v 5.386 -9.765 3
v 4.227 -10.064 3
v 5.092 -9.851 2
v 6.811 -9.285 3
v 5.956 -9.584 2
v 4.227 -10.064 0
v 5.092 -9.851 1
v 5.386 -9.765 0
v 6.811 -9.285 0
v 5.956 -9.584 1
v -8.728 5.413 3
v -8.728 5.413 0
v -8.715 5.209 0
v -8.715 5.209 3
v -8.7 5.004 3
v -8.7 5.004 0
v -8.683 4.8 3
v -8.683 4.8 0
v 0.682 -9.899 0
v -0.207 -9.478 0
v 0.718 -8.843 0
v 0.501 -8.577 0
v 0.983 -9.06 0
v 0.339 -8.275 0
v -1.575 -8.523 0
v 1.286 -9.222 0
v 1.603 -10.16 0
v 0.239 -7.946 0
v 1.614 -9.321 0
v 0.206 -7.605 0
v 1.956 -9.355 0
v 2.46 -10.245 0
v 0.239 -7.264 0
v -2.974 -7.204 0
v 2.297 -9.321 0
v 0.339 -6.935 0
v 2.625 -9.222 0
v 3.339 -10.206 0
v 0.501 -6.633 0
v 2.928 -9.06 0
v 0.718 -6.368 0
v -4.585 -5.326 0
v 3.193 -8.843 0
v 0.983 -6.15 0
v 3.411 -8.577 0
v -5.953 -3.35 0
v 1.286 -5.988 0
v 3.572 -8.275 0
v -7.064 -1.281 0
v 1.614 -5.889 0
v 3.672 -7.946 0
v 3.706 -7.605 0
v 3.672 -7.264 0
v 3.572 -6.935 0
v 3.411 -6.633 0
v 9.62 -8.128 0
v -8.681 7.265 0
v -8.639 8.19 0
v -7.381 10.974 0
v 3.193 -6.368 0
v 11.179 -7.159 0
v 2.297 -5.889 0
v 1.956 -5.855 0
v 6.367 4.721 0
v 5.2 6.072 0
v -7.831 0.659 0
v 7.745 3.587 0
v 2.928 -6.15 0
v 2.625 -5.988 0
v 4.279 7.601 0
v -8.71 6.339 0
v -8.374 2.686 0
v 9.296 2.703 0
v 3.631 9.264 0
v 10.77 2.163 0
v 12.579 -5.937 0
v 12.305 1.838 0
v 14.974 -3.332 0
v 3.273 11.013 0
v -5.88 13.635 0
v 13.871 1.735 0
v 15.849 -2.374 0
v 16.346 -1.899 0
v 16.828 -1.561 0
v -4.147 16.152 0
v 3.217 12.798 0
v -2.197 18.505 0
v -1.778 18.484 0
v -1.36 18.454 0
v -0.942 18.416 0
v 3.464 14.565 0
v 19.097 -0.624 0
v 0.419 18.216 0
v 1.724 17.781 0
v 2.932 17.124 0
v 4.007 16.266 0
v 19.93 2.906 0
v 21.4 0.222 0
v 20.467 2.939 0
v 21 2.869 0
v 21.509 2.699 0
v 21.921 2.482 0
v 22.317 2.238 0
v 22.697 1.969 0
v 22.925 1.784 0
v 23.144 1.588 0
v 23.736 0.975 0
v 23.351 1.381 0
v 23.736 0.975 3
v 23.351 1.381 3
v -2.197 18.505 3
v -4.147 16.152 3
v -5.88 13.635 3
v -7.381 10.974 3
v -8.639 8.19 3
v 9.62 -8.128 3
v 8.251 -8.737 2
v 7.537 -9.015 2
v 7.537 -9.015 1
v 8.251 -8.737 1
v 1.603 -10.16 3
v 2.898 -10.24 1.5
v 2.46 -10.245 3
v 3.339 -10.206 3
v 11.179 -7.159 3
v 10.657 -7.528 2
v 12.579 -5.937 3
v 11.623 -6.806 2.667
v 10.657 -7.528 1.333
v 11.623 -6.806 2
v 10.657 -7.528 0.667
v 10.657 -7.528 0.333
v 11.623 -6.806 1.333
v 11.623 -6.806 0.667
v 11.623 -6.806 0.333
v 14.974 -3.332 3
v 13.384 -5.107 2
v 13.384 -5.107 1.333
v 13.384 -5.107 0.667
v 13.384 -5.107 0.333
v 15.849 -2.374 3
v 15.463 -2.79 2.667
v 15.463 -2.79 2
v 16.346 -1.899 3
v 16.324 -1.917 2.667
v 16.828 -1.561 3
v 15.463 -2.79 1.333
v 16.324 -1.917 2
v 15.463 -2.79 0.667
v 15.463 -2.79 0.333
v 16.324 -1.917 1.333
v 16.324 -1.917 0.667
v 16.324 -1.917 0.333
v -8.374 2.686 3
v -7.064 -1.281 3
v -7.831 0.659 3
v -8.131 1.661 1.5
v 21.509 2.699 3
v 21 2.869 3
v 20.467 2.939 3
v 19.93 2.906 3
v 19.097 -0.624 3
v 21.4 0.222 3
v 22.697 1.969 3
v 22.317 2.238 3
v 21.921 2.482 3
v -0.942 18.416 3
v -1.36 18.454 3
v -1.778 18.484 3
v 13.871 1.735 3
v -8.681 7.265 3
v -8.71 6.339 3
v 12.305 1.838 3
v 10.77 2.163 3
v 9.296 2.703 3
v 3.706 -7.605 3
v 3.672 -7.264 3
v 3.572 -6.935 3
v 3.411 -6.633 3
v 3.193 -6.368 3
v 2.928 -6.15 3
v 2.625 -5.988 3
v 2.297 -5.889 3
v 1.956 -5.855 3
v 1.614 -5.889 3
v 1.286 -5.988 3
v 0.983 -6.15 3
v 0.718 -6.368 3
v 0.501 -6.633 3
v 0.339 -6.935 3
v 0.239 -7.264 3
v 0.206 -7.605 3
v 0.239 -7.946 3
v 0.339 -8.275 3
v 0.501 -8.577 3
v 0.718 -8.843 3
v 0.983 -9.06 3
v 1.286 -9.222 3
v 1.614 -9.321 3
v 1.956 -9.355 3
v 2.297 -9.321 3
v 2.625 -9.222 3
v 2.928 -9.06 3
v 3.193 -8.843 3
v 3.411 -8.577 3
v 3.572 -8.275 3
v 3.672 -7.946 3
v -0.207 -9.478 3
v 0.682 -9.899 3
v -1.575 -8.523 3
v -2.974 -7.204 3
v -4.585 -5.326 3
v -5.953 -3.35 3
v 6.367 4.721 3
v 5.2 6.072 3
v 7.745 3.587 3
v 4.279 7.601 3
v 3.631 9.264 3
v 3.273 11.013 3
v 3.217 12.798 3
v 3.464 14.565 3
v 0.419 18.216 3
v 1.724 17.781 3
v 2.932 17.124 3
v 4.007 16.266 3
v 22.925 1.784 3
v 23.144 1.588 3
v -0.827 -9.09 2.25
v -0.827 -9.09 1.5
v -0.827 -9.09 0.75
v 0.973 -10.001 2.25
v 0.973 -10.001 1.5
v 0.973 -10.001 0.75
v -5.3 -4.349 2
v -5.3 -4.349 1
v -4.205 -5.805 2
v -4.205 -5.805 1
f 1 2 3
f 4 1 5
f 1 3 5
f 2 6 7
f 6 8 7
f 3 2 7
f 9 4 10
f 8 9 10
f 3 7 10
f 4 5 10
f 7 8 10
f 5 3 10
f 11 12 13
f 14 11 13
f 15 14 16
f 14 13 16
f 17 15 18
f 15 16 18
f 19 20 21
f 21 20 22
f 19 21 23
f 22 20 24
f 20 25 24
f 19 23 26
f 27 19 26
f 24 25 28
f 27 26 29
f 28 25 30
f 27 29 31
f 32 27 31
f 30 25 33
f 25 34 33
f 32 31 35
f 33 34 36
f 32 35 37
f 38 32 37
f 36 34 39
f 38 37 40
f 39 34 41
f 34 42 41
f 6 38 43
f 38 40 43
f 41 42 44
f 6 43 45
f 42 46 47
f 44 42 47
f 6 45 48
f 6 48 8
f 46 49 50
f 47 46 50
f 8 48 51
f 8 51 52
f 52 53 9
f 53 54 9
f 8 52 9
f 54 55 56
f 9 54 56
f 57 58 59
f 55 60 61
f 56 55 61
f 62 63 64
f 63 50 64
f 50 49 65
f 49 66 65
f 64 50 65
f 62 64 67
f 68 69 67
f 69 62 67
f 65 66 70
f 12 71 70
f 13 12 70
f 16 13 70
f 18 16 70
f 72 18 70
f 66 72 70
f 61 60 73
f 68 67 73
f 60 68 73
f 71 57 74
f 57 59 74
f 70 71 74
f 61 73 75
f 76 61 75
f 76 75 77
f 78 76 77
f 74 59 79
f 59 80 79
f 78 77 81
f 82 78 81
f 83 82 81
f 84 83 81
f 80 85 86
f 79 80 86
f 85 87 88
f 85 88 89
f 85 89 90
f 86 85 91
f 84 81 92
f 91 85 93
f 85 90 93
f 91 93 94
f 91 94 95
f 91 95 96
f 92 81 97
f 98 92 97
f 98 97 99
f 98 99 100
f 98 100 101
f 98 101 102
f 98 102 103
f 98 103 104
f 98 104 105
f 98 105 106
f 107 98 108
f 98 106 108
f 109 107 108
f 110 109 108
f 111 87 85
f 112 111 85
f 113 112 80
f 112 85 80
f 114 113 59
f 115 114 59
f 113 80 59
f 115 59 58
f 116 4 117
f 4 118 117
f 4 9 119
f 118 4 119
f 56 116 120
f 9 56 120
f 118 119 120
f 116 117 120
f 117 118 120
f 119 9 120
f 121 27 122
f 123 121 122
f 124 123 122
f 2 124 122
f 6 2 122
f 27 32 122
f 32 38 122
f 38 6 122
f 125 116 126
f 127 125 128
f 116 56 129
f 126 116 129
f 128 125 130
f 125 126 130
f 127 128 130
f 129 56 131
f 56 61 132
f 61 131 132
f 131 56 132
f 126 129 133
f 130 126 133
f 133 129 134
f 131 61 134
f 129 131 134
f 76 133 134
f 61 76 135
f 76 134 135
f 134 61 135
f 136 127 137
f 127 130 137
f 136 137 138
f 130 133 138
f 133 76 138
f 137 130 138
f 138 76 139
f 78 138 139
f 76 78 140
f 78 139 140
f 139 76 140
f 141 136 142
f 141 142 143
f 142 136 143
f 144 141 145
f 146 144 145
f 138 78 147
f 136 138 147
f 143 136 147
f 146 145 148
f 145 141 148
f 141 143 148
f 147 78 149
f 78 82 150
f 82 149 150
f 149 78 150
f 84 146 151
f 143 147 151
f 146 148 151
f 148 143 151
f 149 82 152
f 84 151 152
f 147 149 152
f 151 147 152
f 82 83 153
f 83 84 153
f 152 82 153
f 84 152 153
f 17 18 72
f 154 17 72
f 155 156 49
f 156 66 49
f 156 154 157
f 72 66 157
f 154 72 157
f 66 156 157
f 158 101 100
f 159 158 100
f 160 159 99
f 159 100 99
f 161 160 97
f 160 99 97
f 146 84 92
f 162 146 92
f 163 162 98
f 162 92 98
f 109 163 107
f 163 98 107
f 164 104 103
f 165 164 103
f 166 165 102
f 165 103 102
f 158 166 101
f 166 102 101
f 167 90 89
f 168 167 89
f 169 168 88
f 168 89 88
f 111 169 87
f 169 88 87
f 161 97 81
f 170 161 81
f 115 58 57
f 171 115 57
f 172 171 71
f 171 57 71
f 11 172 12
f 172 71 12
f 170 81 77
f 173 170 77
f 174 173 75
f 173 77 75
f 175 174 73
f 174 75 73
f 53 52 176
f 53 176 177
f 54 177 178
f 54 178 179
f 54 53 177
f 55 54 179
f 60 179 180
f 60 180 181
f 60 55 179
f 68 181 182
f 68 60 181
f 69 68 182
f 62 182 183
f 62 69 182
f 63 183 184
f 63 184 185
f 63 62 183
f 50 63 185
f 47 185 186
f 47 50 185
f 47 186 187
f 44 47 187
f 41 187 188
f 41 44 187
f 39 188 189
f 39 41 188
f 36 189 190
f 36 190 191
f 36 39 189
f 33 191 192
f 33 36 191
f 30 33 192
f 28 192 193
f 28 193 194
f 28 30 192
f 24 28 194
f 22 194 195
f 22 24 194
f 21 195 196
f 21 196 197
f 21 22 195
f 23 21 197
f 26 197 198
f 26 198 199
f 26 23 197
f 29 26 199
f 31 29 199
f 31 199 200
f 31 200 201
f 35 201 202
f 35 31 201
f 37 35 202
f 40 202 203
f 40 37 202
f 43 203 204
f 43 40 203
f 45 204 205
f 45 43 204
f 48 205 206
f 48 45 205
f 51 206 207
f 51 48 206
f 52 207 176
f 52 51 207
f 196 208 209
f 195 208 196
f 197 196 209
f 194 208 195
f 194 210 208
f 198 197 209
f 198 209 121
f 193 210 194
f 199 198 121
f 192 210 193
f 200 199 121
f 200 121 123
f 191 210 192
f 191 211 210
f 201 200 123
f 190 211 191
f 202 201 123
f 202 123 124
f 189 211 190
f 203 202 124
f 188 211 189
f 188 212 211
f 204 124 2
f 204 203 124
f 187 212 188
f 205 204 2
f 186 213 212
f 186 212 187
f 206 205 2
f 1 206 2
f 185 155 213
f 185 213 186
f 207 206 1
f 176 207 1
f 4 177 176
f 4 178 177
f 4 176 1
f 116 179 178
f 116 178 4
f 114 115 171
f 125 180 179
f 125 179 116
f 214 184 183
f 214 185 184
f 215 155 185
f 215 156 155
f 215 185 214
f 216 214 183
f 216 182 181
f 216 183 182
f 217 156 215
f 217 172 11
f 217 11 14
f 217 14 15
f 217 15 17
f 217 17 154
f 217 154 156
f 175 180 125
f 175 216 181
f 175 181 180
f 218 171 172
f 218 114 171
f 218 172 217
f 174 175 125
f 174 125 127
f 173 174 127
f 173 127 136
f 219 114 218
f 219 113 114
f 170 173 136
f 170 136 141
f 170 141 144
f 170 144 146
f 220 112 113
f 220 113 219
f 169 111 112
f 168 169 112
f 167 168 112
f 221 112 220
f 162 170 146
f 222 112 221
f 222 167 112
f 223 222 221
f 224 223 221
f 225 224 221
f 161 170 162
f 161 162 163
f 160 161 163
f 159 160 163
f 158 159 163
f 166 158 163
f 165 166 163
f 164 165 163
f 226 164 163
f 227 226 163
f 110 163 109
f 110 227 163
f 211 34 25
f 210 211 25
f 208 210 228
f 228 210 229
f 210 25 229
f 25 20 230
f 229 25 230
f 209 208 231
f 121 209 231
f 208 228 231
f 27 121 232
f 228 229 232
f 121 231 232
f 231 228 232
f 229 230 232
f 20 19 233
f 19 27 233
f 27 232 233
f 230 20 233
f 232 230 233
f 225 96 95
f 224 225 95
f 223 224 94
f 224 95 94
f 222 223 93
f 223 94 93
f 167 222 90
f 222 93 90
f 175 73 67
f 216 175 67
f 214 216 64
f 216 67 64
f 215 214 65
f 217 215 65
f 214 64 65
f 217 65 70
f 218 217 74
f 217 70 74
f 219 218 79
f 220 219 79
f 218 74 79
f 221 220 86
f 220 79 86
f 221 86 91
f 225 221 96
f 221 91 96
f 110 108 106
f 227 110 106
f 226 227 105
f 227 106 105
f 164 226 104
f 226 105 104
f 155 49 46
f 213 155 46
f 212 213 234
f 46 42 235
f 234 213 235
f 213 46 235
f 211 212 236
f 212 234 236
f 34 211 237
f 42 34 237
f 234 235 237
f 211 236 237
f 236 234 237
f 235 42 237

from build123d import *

# Parameters (mm, degrees)
SKETCH1_R           = 1.75
BOSS_EXTRUDE1_DEPTH = 3


with BuildPart() as part:
    # Sketch1 → Boss-Extrude1 (new body)
    with BuildSketch(Plane.XY):
        with BuildLine():
            Line((19.930411003, 2.905988798), (13.87145238, 1.735459786))
            ThreePointArc((13.87145238, 1.735459786), (11.531557717, 1.972597442), (9.296030987, 2.703187301))
            ThreePointArc((9.296030987, 2.703187301), (3.919484189, 8.419131518), (4.006841218, 16.265891519))
            ThreePointArc((4.006841218, 16.265891519), (1.723665713, 17.781070836), (-0.941946899, 18.416026075))
            ThreePointArc((-0.941946899, 18.416026075), (-1.568863415, 18.470126635), (-2.197160171, 18.50468636))
            ThreePointArc((-2.197160171, 18.50468636), (-5.87970066, 13.635417111), (-8.639038917, 8.189598545))
            ThreePointArc((-8.639038917, 8.189598545), (-8.697179287, 6.801867653), (-8.727525387, 5.413250916))
            ThreePointArc((-8.727525387, 5.413250916), (-8.707936379, 5.106364202), (-8.683372389, 4.799835582))
            add(Edge.make_bspline(
                [(-8.683372389, 4.799835582), (-8.588074591, 3.721163805), (-8.402294299, 2.674479561), (-7.859371187, 0.648508115), (-7.502052979, -0.331606117), (-7.064007696, -1.28129998)],
                knots=[0, 0, 0, 0, 0.5, 0.5, 1, 1, 1, 1], degree=3))
            add(Edge.make_bspline(
                [(-7.064007696, -1.28129998), (-6.575170871, -2.34111126), (-5.98506043, -3.361216675), (-4.957629948, -4.84262589), (-4.59187789, -5.329143335), (-3.817976232, -6.281801183), (-3.40882724, -6.74810305), (-2.97381792, -7.203826342)],
                knots=[0, 0, 0, 0, 0.5, 0.5, 0.75, 0.75, 1, 1, 1, 1], degree=3))
            add(Edge.make_bspline(
                [(-2.97381792, -7.203826342), (-2.306446509, -7.902976179), (-1.590279206, -8.56570689), (-0.445412997, -9.35234524), (-0.053513063, -9.579507747), (0.556953087, -9.853650755), (0.764136141, -9.933887283), (1.181773294, -10.067725648), (1.391009263, -10.121047129), (1.602766598, -10.159905725)],
                knots=[0, 0, 0, 0, 0.5, 0.5, 0.75, 0.75, 0.875, 0.875, 1, 1, 1, 1], degree=3))
            add(Edge.make_bspline(
                [(1.602766598, -10.159905725), (2.019871783, -10.236446742), (2.459018956, -10.260016432), (3.337272754, -10.220368292), (3.779944348, -10.157384511), (4.227454337, -10.064224837)],
                knots=[0, 0, 0, 0, 0.5, 0.5, 1, 1, 1, 1], degree=3))
            add(Edge.make_bspline(
                [(4.227454337, -10.064224837), (5.089770185, -9.88471362), (5.962802505, -9.592227299), (6.811456082, -9.284683988)],
                knots=[0, 0, 0, 0, 1, 1, 1, 1], degree=3))
            add(Edge.make_bspline(
                [(6.811456082, -9.284683988), (7.056520313, -9.195875236), (7.297794582, -9.106311657), (7.776758126, -8.924041304), (8.015576329, -8.831105295), (8.722360856, -8.547506225), (9.179802119, -8.35044286), (9.620286504, -8.127847225)],
                knots=[0, 0, 0, 0, 0.25, 0.25, 0.5, 0.5, 1, 1, 1, 1], degree=3))
            add(Edge.make_bspline(
                [(9.620286504, -8.127847225), (9.800382572, -8.036836964), (9.977339671, -7.94180455), (10.322866167, -7.742648629), (10.490967018, -7.638558401), (10.990123709, -7.307373872), (11.312673774, -7.064183232), (12.24261019, -6.291133214), (12.820931233, -5.712035881), (13.94631914, -4.501489979), (14.49233771, -3.8697351), (15.184900578, -3.09577571), (15.323634143, -2.942251733), (15.602122385, -2.637726794), (15.743780167, -2.483440537), (16.029801415, -2.186068127), (16.169367003, -2.0474533), (16.479304052, -1.785805781), (16.652919268, -1.664467301), (16.828175246, -1.561356406)],
                knots=[0, 0, 0, 0, 0.0625, 0.0625, 0.125, 0.125, 0.25, 0.25, 0.5, 0.5, 0.75, 0.75, 0.8125, 0.8125, 0.875, 0.875, 0.9375, 0.9375, 1, 1, 1, 1], degree=3))
            ThreePointArc((16.828175246, -1.561356406), (20.244272985, -0.189669108), (23.736412446, 0.974895959))
            Line((23.736412446, 0.974895959), (23.351331305, 1.380731944))
            ThreePointArc((23.351331305, 1.380731944), (23.035702836, 1.68776393), (22.696524646, 1.968563017))
            ThreePointArc((22.696524646, 1.968563017), (22.121114049, 2.363611886), (21.509254361, 2.699452157))
            ThreePointArc((21.509254361, 2.699452157), (20.73478902, 2.91705232), (19.930411003, 2.905988798))
        make_face()
        with Locations((1.955579729, -7.60507725)):
            Circle(SKETCH1_R, mode=Mode.SUBTRACT)
    extrude(amount=BOSS_EXTRUDE1_DEPTH)


solid = part.part
